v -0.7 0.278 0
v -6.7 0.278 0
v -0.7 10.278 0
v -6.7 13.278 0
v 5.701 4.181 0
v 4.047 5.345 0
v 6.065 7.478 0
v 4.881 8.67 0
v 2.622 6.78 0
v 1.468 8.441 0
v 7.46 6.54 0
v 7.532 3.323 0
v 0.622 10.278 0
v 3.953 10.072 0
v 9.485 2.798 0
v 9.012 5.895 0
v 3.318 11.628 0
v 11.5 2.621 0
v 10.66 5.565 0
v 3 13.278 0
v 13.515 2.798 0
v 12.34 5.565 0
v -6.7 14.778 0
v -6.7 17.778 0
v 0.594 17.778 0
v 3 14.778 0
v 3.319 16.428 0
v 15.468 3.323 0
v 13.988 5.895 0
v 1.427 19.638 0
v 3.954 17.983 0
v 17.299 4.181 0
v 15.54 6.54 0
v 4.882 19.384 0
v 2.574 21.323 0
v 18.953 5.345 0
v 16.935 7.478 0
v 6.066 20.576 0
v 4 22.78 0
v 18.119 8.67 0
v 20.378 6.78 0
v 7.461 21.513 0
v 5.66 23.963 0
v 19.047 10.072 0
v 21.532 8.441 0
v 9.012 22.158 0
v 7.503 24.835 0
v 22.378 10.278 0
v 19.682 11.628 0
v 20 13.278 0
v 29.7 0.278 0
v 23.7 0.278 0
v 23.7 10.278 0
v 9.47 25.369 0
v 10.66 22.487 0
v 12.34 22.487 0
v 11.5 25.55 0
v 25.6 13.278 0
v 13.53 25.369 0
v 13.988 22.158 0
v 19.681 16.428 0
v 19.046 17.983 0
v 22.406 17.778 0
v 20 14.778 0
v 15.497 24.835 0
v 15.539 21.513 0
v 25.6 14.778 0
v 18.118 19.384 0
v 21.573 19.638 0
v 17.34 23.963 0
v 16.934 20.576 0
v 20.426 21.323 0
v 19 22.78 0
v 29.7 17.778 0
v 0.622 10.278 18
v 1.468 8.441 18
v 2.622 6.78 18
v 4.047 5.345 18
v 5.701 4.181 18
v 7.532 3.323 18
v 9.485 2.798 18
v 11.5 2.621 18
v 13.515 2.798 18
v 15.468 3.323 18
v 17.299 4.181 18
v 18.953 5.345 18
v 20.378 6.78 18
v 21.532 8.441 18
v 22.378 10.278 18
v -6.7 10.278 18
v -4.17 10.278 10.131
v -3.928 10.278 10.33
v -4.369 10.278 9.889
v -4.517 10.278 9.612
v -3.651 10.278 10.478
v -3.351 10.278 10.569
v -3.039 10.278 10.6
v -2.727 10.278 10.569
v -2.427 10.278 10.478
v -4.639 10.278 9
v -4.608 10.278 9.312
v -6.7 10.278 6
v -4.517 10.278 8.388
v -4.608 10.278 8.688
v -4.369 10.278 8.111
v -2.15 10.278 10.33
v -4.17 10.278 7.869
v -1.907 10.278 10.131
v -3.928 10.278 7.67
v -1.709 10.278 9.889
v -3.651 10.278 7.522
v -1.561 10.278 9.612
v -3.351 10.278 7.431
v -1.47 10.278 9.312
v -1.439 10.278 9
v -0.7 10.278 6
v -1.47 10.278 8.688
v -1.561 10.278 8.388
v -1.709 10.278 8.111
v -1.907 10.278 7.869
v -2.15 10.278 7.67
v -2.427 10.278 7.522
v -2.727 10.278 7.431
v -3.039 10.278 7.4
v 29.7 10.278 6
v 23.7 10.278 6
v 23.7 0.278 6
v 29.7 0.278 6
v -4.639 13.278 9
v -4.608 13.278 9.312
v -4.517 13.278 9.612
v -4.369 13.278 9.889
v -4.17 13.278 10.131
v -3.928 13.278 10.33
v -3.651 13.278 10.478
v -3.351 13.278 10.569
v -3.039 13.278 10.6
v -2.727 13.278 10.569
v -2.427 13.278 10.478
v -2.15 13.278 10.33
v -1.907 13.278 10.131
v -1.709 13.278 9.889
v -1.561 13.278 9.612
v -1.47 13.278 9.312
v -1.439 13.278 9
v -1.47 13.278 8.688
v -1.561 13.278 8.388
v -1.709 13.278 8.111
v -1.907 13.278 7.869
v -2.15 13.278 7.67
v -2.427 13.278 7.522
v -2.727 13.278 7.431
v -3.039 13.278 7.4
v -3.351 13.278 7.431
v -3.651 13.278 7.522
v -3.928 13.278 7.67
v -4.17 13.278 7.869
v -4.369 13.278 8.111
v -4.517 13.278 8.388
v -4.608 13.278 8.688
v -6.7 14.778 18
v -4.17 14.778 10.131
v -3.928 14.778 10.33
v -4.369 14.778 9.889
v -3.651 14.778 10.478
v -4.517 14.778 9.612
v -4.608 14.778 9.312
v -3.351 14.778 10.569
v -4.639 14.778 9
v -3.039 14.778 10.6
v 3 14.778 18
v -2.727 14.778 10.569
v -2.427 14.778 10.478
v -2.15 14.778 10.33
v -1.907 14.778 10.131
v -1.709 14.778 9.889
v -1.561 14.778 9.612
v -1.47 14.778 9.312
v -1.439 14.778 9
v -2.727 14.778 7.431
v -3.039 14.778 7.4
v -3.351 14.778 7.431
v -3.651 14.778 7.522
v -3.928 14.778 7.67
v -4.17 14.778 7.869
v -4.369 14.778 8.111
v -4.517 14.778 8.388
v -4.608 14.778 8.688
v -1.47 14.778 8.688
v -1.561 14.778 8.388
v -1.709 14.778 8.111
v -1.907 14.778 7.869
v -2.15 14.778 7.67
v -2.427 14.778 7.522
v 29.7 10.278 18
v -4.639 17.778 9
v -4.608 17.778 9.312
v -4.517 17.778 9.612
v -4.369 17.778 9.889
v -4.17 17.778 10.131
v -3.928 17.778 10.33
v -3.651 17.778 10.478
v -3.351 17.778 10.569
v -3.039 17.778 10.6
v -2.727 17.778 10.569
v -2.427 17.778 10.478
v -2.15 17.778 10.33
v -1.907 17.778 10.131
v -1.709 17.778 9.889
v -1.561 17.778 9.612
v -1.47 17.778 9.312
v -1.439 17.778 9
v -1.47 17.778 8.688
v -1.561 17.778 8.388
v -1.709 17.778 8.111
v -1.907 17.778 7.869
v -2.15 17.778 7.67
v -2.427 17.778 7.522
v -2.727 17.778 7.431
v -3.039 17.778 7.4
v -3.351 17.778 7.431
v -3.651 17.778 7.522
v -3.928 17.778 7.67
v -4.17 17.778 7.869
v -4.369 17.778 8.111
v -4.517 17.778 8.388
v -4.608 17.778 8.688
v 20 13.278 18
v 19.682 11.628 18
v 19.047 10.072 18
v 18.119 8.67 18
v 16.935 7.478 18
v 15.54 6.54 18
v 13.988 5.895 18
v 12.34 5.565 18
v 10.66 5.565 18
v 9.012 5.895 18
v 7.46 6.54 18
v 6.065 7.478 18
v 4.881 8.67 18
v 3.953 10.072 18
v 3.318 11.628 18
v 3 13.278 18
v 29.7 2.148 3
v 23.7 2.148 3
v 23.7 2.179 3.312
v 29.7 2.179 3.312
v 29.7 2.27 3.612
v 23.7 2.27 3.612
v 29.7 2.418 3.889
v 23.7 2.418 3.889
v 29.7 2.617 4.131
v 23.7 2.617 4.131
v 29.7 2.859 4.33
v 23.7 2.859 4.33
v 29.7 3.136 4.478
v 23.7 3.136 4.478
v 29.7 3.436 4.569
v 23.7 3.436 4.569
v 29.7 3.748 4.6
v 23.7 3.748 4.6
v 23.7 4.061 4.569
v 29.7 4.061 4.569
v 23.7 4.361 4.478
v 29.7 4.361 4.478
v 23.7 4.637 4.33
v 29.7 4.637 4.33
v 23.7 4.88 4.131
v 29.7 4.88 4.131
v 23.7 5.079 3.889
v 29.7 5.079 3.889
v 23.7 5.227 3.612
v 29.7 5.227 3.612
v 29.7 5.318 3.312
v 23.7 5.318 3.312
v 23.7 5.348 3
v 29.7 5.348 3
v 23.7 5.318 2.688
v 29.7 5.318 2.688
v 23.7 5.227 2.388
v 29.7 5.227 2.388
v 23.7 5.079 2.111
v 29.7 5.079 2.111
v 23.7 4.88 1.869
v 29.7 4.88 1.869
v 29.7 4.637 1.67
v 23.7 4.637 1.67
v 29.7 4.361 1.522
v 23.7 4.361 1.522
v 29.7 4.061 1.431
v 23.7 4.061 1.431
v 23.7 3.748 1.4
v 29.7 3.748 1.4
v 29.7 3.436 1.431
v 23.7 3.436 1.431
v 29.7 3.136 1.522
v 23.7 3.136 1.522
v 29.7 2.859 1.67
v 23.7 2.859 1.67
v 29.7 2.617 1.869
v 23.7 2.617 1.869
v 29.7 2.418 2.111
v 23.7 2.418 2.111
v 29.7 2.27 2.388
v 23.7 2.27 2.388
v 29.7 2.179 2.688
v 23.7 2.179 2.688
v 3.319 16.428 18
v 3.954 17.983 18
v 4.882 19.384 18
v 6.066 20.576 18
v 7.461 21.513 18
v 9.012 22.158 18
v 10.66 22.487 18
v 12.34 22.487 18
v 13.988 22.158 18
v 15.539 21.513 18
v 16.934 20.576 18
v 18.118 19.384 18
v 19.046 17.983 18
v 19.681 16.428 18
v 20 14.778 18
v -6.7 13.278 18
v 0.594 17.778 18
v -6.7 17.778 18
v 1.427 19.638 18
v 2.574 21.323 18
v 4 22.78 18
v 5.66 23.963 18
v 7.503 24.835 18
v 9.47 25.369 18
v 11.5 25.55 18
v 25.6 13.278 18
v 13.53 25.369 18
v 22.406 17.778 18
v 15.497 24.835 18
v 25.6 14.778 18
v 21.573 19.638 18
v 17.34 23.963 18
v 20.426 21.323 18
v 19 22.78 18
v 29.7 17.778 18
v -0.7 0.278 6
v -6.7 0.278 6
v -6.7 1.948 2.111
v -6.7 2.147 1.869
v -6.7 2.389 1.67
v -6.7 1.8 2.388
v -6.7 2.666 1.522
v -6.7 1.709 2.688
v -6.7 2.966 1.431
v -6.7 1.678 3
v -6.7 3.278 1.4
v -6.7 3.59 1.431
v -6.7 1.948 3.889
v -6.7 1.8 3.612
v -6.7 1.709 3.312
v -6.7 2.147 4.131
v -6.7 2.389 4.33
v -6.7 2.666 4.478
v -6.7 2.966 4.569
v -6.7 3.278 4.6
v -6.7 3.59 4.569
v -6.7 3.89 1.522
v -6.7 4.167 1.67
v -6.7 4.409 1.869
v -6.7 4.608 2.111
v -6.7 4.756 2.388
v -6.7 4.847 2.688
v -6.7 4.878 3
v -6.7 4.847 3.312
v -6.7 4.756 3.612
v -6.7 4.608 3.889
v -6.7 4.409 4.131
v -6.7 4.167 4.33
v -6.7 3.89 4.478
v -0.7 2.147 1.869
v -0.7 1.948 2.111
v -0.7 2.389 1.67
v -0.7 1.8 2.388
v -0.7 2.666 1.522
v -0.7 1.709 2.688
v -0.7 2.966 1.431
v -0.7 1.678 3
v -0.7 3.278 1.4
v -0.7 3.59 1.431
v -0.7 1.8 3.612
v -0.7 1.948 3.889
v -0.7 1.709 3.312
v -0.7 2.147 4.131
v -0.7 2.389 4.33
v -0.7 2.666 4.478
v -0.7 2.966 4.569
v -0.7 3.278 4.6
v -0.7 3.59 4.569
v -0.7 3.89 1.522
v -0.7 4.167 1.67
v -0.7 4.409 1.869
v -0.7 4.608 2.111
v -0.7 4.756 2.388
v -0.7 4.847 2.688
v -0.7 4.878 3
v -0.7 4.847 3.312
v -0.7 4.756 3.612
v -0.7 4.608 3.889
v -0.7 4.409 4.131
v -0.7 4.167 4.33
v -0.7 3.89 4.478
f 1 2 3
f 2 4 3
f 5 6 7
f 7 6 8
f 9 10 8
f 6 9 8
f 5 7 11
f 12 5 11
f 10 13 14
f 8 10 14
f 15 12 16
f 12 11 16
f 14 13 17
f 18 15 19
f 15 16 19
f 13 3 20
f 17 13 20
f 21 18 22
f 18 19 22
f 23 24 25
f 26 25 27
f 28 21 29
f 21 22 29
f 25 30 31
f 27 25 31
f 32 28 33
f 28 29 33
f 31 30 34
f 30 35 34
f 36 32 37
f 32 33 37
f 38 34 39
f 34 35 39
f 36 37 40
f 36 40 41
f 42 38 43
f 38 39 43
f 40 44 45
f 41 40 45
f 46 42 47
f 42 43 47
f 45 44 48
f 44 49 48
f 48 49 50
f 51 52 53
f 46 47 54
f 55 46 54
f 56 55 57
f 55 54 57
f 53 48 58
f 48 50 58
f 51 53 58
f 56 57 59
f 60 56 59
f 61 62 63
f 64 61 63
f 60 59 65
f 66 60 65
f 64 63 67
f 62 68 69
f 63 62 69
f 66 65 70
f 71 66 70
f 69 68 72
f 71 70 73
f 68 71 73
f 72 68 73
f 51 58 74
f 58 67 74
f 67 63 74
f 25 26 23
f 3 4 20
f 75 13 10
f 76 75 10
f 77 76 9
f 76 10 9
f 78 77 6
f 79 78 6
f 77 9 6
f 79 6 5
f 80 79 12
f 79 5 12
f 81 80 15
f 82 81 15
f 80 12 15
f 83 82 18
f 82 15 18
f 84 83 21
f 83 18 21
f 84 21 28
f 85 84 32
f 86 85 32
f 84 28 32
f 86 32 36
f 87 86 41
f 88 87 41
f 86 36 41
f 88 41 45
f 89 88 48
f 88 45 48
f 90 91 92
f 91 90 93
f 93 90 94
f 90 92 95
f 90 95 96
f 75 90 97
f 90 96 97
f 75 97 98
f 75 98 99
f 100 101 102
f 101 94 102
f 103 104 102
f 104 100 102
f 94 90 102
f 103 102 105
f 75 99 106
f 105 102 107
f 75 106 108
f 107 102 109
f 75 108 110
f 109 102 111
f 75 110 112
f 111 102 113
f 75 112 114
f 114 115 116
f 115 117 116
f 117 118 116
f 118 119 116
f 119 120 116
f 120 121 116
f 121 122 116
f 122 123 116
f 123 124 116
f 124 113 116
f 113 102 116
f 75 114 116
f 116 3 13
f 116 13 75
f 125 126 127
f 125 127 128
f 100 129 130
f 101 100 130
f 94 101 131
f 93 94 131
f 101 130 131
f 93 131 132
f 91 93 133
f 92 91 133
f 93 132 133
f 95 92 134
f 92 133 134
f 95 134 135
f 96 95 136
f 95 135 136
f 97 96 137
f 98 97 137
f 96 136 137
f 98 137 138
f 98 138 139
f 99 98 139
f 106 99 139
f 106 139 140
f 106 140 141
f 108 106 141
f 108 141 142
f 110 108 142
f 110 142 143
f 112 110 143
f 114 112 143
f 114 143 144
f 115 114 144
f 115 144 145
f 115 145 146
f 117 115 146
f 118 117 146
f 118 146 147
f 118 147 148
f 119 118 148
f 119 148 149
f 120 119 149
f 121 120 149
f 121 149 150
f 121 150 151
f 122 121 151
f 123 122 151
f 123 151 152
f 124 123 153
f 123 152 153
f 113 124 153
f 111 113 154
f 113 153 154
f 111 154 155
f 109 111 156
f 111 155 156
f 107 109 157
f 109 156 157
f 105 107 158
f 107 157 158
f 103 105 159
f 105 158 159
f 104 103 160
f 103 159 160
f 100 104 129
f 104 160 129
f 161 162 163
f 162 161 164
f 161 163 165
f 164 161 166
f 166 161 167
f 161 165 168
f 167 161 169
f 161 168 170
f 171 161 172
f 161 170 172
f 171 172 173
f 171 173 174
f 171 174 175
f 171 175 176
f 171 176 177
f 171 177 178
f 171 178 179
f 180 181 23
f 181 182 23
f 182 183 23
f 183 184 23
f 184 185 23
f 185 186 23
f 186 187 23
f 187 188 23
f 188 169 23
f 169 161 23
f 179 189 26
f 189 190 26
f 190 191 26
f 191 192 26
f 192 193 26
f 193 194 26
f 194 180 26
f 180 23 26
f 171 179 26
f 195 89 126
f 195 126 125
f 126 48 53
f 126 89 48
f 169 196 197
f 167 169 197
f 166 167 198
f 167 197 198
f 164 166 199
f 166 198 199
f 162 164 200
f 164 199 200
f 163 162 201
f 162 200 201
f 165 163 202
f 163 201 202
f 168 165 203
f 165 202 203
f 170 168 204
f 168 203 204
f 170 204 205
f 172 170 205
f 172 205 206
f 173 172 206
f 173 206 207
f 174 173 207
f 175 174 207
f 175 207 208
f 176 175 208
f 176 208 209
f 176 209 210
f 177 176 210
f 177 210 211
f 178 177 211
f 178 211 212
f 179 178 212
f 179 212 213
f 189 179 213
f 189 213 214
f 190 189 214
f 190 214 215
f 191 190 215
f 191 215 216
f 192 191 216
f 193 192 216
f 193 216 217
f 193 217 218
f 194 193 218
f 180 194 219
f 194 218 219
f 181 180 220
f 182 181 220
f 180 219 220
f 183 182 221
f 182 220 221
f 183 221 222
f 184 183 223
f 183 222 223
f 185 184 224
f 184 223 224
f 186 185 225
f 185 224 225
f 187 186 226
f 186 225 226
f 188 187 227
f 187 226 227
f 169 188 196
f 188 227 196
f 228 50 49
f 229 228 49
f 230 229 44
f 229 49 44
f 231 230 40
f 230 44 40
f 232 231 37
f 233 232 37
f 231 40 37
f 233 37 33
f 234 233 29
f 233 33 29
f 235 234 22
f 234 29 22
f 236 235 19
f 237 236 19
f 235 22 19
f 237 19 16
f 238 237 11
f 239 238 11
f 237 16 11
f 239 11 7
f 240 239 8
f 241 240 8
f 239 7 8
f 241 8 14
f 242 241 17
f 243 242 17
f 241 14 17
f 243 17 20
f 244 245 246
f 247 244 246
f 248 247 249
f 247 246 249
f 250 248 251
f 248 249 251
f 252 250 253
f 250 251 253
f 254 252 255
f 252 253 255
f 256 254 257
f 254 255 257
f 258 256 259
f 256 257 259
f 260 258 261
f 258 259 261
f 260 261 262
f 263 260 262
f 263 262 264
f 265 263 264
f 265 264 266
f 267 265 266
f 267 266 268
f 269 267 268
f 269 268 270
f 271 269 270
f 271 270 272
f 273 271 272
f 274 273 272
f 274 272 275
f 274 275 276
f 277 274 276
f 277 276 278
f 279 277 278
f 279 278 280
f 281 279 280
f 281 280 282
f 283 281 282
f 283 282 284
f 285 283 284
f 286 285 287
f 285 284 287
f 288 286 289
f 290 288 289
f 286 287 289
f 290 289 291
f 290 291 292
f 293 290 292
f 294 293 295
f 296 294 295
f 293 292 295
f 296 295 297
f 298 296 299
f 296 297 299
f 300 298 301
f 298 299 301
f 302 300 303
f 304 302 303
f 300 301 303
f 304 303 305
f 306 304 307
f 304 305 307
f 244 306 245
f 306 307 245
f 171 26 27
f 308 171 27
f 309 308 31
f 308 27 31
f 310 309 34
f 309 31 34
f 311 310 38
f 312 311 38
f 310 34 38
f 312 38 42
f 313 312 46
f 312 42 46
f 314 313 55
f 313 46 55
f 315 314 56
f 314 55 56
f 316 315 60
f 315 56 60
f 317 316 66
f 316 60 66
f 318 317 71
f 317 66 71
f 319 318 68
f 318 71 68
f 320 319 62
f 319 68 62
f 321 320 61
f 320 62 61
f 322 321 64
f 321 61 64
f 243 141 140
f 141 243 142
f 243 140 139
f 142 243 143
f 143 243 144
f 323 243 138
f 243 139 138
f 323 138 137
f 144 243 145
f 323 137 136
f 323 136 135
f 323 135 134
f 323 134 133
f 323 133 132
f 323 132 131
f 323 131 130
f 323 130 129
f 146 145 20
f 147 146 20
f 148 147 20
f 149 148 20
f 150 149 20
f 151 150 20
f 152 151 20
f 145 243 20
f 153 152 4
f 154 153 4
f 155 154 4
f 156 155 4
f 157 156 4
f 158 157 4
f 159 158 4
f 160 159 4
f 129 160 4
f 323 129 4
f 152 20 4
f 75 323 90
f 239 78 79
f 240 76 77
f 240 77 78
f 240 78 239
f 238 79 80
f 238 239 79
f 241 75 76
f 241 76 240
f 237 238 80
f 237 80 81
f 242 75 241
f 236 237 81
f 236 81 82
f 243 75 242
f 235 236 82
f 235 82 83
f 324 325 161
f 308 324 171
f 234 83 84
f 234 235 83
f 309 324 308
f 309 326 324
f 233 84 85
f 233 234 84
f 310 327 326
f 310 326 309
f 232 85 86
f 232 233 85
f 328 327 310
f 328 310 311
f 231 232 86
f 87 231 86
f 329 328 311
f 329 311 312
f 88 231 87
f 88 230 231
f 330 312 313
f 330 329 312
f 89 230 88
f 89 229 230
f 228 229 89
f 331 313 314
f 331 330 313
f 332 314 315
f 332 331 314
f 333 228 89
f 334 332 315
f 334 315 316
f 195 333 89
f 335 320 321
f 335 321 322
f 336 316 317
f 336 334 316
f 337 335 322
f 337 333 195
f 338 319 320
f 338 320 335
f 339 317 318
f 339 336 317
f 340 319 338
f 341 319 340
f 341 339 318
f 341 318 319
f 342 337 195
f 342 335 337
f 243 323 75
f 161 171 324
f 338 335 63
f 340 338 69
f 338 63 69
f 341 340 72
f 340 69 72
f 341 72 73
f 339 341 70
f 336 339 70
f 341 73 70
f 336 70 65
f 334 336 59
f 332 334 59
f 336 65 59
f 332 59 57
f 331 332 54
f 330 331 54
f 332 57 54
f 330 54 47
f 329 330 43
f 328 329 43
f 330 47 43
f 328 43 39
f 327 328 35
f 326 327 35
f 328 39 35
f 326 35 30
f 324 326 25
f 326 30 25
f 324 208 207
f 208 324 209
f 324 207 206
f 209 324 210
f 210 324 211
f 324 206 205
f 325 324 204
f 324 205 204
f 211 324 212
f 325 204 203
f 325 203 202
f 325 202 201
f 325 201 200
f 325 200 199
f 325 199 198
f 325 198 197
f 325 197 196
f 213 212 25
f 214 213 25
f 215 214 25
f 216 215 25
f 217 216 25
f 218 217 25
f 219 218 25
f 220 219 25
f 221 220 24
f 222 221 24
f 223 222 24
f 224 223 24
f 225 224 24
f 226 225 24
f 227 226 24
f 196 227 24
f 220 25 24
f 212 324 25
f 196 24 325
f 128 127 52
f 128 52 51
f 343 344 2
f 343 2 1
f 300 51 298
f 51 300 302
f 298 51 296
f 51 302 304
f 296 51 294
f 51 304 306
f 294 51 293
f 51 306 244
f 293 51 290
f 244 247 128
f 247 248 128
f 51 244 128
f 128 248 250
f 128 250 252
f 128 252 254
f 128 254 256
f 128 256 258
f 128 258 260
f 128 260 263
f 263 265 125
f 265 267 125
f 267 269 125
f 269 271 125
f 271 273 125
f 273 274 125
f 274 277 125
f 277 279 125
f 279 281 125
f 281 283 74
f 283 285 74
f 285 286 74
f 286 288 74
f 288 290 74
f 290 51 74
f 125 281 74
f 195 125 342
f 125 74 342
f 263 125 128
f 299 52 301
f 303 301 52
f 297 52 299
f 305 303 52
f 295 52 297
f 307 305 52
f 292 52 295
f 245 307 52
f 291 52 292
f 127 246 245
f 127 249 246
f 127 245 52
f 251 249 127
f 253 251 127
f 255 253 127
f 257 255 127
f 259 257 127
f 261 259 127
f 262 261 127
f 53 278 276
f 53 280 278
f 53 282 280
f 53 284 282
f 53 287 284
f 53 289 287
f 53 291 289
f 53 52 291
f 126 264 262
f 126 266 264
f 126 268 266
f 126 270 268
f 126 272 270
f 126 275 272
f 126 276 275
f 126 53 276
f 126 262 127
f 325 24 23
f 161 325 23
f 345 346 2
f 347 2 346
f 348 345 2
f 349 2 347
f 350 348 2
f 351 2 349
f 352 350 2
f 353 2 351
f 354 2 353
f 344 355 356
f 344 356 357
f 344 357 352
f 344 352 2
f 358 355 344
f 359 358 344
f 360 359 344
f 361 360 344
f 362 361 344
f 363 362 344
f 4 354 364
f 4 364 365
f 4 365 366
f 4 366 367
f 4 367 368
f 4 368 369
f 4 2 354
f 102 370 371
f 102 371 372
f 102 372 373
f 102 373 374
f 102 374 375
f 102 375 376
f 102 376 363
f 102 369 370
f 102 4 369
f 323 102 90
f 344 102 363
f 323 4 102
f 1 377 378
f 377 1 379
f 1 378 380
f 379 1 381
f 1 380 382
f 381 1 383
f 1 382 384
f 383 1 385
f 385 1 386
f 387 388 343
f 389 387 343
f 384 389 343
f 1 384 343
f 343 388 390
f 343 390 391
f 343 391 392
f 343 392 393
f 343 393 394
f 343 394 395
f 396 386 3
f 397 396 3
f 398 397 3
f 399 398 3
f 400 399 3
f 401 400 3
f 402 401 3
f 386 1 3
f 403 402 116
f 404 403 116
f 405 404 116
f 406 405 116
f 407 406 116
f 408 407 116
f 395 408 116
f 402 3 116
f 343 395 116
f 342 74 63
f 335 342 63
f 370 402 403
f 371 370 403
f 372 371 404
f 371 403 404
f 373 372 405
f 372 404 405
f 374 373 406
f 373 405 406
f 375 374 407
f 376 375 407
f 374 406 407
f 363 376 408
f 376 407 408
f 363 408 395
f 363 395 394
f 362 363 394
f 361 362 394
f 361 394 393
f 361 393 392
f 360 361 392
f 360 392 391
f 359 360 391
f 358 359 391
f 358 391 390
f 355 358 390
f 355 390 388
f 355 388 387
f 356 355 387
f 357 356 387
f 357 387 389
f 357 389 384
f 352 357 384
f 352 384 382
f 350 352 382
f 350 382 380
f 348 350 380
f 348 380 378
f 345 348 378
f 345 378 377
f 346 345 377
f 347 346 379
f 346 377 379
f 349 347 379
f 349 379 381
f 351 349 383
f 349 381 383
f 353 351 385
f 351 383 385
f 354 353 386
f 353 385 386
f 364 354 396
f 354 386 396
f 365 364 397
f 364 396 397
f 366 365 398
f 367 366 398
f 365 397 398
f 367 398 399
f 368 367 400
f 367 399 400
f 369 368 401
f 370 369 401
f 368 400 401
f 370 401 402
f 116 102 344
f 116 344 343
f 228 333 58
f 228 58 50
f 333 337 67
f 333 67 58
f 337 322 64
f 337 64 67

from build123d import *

# Parameters (mm, degrees)
F1_DEPTH  = 18
F3_D      = 3.2
F3_DEPTH  = 15
F4_W      = 6
F4_H      = 6
F5_DEPTH  = 10
F6_W      = 6
F6_H      = 6
F7_DEPTH  = 10
F9_D      = 3.2
F9_DEPTH  = 6
F11_D     = 3.2
F11_DEPTH = 6


with BuildPart() as f1:
    # F0 (on Top) → F1 (new body)
    with BuildSketch(Plane.XY):
        with BuildLine():
            Line((3, 13.278079), (-6.7, 13.278079))
            Line((-6.7, 13.278079), (-6.7, 10.278079))
            Line((-6.7, 10.278079), (0.622289, 10.278079))
            ThreePointArc((0.622289, 10.278079), (11.5, 2.620549), (22.377711, 10.278079))
            Line((22.377711, 10.278079), (23, 10.278079))
            Line((23, 10.278079), (29.7, 10.278079))
            Line((29.7, 10.278079), (29.7, 17.778079))
            Line((29.7, 17.778079), (22.406277, 17.778079))
            ThreePointArc((22.406277, 17.778079), (11.5, 25.549511), (0.593723, 17.778079))
            Line((0.593723, 17.778079), (-6.7, 17.778079))
            Line((-6.7, 17.778079), (-6.7, 14.778079))
            Line((-6.7, 14.778079), (3, 14.778079))
            ThreePointArc((3, 14.778079), (11.5, 22.528734), (20, 14.778079))
            Line((20, 14.778079), (25.6, 14.778079))
            Line((25.6, 14.778079), (25.6, 13.278079))
            Line((25.6, 13.278079), (23, 13.278079))
            Line((23, 13.278079), (20, 13.278079))
            ThreePointArc((20, 13.278079), (11.5, 5.523889), (3, 13.278079))
        make_face()
    extrude(amount=F1_DEPTH)

    # F3
    with Locations(Plane.XZ.offset(-10.278079)):
        with Locations((-3.038855, 9)):
            Hole(F3_D / 2, depth=F3_DEPTH)

    # F4 (on face) → F5 (join)
    with BuildSketch(Plane.XZ.offset(-10.278079)):
        with Locations((26.7, 3)):
            Rectangle(F4_W, F4_H)
    extrude(amount=F5_DEPTH)

    # F6 (on face) → F7 (join)
    with BuildSketch(Plane.XZ.offset(-10.278079)):
        with Locations((-3.7, 3)):
            Rectangle(F6_W, F6_H)
    extrude(amount=F7_DEPTH)

    # F9
    with Locations(Plane.YZ.offset(29.7)):
        with Locations((3.748374, 3)):
            Hole(F9_D / 2, depth=F9_DEPTH)

    # F11
    with Locations(Plane(origin=(-6.7, 0, 0), x_dir=(0, -1, 0), z_dir=(-1, 0, 0))):
        with Locations((-3.278079, 3)):
            Hole(F11_D / 2, depth=F11_DEPTH)


solid = f1.part
